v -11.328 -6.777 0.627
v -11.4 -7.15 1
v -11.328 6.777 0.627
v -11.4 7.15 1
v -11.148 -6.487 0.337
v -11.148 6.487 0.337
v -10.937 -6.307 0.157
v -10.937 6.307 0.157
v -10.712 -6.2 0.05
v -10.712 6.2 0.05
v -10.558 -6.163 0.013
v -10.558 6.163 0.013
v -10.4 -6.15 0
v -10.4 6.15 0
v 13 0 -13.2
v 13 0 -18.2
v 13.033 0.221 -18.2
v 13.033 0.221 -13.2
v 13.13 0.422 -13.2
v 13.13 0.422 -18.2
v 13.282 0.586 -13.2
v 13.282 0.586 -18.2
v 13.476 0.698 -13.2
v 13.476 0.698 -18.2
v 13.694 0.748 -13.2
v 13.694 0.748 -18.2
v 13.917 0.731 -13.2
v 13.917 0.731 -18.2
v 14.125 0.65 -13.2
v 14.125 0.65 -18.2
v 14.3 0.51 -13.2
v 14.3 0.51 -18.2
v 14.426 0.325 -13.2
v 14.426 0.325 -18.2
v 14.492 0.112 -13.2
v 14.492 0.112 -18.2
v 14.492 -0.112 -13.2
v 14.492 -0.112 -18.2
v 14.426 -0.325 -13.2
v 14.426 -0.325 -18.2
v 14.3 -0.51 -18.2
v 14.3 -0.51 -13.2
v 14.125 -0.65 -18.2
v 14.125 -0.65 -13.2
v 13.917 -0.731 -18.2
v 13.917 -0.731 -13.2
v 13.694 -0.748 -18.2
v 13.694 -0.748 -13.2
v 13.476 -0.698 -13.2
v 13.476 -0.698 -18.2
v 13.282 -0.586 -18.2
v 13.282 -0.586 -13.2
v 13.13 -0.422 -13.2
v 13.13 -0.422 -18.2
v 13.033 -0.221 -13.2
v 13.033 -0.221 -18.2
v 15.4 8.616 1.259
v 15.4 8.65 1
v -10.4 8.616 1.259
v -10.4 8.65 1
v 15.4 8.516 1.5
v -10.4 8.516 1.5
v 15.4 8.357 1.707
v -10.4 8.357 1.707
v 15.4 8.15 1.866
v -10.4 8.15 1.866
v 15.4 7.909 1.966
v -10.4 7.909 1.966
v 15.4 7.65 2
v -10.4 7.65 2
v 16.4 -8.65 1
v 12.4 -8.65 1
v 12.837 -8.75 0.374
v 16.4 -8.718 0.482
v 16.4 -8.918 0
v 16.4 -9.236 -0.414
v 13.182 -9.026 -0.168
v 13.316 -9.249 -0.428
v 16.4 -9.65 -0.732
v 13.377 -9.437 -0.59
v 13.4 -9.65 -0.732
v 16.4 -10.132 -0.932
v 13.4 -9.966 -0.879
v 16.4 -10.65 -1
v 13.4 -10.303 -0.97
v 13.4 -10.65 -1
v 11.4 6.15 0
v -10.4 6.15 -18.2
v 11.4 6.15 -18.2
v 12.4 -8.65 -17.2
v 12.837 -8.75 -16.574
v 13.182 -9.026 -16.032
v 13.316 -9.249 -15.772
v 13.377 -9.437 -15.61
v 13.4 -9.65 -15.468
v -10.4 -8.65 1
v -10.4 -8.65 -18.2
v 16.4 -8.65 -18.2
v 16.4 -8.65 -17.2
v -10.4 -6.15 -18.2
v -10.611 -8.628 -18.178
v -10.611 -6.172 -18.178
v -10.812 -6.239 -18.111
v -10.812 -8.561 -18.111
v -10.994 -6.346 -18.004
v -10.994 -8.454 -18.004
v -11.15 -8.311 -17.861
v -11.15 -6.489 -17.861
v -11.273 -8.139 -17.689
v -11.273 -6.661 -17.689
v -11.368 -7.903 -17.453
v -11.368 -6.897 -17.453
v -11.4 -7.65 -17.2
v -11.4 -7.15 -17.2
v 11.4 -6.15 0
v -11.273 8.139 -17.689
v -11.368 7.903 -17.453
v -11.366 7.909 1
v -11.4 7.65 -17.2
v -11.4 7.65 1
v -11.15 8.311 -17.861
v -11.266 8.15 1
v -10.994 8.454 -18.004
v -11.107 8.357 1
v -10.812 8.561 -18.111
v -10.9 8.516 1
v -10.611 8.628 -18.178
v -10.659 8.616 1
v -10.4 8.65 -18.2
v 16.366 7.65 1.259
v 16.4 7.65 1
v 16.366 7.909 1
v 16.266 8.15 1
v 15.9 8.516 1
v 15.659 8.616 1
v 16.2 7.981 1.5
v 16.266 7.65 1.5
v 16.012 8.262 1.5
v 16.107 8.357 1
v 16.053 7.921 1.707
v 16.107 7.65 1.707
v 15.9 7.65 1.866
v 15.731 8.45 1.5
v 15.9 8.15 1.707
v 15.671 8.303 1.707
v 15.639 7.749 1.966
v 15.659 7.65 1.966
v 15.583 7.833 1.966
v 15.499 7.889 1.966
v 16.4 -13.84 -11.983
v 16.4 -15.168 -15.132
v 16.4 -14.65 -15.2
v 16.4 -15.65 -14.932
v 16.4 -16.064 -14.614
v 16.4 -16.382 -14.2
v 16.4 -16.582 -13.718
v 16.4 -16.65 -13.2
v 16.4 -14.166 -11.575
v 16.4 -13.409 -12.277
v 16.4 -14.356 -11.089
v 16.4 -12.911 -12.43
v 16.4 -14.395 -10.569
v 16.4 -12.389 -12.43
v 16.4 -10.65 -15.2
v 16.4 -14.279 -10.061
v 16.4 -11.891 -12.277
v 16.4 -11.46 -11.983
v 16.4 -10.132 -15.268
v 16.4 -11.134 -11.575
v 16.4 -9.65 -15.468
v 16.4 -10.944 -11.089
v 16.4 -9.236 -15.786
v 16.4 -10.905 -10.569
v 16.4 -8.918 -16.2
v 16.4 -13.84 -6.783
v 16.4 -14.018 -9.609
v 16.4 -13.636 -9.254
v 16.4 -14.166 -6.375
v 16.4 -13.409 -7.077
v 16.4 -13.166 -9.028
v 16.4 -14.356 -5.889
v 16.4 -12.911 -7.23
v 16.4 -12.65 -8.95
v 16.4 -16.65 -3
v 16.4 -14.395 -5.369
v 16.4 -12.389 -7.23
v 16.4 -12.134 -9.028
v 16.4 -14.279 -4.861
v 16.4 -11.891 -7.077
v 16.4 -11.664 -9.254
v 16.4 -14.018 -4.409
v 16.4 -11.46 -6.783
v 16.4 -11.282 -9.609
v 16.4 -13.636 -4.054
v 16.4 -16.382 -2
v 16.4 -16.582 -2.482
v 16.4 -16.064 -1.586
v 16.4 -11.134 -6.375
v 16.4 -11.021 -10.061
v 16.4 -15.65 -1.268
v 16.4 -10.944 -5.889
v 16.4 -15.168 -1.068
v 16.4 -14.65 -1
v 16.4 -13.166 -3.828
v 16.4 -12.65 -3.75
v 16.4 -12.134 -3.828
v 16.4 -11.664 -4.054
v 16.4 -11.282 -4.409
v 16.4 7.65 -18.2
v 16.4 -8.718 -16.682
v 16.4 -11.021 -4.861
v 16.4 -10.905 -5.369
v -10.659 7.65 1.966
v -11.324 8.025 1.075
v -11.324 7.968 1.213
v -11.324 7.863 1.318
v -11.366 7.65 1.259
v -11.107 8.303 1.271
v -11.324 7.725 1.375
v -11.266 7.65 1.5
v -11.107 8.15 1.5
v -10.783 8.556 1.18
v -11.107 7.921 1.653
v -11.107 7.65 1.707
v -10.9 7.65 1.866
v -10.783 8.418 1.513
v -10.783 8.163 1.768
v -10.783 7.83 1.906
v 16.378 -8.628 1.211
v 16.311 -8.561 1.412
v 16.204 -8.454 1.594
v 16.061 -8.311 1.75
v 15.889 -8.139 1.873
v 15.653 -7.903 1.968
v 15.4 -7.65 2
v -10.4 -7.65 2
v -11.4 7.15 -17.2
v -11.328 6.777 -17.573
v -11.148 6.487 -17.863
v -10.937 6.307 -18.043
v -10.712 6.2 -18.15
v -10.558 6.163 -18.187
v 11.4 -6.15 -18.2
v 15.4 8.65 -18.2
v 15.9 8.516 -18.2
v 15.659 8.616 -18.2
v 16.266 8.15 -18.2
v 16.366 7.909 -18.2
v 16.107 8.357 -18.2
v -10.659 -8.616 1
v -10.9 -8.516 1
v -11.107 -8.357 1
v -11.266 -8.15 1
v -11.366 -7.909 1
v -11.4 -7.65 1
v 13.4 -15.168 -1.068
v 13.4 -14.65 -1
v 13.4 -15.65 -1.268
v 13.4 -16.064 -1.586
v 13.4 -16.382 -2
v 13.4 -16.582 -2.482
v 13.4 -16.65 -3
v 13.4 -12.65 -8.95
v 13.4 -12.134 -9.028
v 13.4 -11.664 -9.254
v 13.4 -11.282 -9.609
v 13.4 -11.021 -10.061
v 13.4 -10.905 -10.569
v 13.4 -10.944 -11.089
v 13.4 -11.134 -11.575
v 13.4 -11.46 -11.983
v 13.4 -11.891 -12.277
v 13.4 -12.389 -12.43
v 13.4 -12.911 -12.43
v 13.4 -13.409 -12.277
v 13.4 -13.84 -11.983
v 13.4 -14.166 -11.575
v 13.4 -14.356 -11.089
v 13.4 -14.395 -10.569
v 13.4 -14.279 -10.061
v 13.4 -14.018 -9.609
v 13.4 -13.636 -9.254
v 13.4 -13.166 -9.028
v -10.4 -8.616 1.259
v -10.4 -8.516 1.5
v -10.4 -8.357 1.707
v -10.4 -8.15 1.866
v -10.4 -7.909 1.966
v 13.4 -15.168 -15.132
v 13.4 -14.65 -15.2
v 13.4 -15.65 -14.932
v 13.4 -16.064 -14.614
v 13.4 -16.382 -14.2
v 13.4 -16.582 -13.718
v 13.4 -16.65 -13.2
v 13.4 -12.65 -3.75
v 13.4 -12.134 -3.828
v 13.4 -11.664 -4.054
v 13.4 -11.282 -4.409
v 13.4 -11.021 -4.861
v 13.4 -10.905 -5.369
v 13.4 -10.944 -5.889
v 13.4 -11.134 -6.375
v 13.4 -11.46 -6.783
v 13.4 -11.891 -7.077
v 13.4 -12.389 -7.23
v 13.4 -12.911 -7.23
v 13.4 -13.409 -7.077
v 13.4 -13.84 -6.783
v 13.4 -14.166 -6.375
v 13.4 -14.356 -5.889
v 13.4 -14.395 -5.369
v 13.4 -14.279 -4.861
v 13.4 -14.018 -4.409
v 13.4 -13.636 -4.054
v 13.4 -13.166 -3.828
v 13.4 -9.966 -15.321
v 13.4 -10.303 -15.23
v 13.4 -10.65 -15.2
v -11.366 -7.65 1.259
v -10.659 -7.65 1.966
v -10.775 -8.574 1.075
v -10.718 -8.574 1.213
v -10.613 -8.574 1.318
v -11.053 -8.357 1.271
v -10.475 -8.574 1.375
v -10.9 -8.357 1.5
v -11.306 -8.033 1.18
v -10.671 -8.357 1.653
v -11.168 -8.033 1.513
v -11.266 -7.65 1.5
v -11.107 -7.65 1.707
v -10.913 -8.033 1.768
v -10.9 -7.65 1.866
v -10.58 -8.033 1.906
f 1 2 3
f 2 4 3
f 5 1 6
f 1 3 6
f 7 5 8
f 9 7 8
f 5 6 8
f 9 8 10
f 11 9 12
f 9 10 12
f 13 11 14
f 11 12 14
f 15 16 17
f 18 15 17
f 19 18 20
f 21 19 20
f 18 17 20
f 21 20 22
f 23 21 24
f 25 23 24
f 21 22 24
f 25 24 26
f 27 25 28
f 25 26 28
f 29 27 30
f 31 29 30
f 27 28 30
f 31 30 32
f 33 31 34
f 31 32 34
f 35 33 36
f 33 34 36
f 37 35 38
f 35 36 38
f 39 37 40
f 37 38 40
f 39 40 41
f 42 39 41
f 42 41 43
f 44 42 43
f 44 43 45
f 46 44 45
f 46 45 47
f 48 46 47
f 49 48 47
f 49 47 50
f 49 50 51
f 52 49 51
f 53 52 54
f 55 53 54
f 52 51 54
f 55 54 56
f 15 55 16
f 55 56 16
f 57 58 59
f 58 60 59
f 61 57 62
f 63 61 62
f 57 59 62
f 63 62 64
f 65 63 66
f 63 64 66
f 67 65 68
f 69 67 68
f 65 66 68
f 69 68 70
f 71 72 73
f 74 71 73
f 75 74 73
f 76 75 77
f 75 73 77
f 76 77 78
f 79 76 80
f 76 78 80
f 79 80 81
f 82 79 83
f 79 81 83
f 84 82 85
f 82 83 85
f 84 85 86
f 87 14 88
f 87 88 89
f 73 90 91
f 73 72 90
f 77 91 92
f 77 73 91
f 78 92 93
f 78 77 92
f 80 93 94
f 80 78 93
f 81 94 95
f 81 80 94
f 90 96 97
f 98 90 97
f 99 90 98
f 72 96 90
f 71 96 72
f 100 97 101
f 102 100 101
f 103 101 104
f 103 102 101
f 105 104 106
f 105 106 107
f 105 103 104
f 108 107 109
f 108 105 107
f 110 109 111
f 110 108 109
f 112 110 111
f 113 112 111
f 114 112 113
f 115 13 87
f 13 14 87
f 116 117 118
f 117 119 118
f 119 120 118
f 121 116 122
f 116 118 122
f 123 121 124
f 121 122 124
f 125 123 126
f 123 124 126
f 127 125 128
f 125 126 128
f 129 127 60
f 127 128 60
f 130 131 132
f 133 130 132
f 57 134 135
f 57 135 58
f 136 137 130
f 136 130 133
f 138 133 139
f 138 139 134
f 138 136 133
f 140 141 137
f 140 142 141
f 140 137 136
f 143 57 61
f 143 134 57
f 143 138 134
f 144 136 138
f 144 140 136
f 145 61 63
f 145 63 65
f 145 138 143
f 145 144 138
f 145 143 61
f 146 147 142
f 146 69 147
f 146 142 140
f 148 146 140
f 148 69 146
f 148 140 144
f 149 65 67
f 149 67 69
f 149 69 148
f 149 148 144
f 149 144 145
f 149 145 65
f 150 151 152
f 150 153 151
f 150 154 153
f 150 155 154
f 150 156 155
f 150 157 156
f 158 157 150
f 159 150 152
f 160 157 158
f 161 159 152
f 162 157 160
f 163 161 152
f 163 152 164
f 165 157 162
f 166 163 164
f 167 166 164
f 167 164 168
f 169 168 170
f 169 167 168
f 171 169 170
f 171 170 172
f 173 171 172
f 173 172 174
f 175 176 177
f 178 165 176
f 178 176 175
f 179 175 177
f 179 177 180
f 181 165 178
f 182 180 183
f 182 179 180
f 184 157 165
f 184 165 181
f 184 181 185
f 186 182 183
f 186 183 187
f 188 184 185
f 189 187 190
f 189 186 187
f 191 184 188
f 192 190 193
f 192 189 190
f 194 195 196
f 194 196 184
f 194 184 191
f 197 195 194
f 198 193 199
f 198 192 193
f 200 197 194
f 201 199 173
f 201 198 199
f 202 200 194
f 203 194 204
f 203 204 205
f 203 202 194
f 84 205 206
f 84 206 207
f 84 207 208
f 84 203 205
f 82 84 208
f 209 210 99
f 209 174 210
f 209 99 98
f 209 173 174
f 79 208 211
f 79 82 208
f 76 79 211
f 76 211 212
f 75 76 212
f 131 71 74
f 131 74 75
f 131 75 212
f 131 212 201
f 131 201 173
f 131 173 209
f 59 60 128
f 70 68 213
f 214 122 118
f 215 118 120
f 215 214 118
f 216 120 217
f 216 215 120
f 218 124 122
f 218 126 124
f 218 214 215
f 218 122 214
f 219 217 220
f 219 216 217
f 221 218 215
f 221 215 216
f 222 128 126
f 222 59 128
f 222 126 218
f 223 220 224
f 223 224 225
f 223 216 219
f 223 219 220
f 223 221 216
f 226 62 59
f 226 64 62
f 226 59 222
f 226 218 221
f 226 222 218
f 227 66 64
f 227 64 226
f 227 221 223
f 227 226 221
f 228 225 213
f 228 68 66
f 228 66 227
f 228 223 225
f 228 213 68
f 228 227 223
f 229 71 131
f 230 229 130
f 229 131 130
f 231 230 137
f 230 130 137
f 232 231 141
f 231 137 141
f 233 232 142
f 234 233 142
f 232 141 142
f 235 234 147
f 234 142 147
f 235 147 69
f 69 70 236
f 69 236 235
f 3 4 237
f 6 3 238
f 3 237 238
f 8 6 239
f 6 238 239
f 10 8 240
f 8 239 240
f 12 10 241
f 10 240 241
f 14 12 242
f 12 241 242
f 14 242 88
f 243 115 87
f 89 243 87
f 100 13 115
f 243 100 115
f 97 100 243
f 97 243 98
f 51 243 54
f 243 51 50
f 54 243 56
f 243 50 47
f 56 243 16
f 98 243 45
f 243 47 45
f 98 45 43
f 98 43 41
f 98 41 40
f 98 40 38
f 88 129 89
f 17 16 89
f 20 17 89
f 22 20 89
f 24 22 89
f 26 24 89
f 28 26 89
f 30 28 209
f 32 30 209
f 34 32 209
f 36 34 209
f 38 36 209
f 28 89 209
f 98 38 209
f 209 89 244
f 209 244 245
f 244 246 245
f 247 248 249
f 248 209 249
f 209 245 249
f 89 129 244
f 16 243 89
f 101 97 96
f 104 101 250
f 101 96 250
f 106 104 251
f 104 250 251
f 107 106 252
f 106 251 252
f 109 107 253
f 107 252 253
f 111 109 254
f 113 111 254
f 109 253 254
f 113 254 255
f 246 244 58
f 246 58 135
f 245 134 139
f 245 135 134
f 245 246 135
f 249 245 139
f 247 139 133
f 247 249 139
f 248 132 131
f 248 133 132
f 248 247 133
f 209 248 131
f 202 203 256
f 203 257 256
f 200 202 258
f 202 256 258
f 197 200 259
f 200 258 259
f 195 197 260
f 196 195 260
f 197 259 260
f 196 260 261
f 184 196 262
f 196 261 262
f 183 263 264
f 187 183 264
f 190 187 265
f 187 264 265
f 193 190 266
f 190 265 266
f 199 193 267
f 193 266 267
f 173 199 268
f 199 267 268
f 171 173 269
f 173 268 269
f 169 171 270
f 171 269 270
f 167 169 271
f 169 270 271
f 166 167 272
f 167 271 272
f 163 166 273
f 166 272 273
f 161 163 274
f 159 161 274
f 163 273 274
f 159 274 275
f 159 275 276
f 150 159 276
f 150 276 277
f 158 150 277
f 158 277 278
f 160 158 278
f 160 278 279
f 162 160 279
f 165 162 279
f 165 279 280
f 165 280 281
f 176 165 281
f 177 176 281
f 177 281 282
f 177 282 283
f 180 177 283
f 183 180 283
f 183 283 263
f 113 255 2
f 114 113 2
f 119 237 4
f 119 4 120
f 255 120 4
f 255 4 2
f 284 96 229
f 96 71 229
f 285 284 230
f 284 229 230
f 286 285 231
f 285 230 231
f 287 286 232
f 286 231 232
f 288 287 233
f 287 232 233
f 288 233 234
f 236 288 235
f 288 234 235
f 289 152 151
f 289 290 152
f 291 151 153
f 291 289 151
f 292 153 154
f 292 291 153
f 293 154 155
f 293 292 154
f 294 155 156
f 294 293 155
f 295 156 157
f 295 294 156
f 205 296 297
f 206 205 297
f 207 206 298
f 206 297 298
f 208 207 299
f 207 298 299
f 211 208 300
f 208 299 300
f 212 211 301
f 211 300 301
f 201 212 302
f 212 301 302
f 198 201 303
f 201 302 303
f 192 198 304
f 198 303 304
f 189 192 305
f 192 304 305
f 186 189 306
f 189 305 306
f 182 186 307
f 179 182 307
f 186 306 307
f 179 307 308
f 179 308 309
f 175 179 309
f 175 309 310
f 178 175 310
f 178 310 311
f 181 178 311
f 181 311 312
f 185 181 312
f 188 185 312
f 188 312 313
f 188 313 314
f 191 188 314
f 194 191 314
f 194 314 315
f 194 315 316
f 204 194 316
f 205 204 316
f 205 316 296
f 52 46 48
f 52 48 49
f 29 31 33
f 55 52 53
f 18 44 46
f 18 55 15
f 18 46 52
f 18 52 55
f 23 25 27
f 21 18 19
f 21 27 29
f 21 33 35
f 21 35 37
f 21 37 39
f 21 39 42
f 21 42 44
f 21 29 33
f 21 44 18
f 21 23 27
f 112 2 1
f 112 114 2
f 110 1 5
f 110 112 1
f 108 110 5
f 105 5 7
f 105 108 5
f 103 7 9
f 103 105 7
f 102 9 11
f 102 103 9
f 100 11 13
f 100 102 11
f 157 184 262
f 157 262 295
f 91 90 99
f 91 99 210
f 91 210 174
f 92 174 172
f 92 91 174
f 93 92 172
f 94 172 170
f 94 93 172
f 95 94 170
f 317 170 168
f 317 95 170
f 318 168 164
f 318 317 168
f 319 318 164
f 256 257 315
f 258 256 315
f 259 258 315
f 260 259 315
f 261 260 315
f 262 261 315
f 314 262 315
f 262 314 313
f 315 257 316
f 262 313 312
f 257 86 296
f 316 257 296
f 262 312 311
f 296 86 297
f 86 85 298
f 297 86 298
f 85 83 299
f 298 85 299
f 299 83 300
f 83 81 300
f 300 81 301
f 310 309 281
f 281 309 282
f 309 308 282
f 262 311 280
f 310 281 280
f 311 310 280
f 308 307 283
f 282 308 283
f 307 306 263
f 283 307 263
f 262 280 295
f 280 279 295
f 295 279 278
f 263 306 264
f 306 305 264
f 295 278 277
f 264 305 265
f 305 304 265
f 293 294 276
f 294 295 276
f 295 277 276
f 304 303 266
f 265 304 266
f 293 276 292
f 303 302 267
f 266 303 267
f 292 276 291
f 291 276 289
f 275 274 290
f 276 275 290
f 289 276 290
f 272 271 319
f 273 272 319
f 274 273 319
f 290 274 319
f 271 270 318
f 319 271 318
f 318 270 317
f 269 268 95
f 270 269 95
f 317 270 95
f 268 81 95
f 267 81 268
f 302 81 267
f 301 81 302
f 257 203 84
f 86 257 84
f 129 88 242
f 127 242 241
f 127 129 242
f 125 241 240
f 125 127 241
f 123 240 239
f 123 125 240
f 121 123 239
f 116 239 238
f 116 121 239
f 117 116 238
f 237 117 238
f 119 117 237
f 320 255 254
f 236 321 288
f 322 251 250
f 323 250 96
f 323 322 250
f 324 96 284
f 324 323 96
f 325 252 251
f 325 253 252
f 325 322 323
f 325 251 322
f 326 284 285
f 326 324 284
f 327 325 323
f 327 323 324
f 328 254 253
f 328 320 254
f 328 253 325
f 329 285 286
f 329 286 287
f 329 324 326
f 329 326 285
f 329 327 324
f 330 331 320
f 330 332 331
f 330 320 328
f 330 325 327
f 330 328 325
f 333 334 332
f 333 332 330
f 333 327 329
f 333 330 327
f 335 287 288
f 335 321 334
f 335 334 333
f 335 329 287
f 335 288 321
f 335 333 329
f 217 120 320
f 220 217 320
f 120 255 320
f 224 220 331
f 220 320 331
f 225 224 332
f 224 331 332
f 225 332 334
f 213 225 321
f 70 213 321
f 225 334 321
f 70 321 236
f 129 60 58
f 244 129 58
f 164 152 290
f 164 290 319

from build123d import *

# Parameters (mm, degrees)
SKETCH1_W           = 22.8
SKETCH1_H           = 12.3
BOSS_EXTRUDE1_DEPTH = 2
SKETCH2_W           = 32.8
SKETCH2_H           = 17.3
SKETCH2_W_2         = 22.8
SKETCH2_H_2         = 12.3
BOSS_EXTRUDE2_DEPTH = 20.2
SKETCH3_W           = 15.2
SKETCH3_H           = 11.3
CUT_EXTRUDE1_DEPTH  = 5
FILLET1_R           = 1
SKETCH4_R           = 0.75
CUT_EXTRUDE2_DEPTH  = 5
SKETCH5_W           = 3.5
SKETCH5_H           = 17.3
CUT_EXTRUDE3_DEPTH  = 28.419381831
FILLET2_R           = 1
SKETCH8_W           = 14.2
SKETCH8_H           = 8
BOSS_EXTRUDE4_DEPTH = 3
SKETCH9_R           = 1.75
CUT_EXTRUDE5_DEPTH  = 37.057627487
FILLET4_R           = 2
SKETCH10_W          = 2.29579642
SKETCH10_H          = 17.3
CUT_EXTRUDE6_DEPTH  = 31.890492065
FILLET5_R           = 1
FILLET6_R           = 1


with BuildPart() as part:
    # Sketch1 → Boss-Extrude1 (new body)
    with BuildSketch(Plane.XY):
        Rectangle(SKETCH1_W, SKETCH1_H)
    extrude(amount=BOSS_EXTRUDE1_DEPTH)

    # Sketch2 → Boss-Extrude2 (add)
    with BuildSketch(Plane.XY.offset(2)):
        Rectangle(SKETCH2_W, SKETCH2_H)
        Rectangle(SKETCH2_W_2, SKETCH2_H_2, mode=Mode.SUBTRACT)
    extrude(amount=-BOSS_EXTRUDE2_DEPTH)

    # Sketch3 → Cut-Extrude1 (cut)
    with BuildSketch(Plane.ZY.offset(16.4)):
        with Locations((-10.6, 0)):
            Rectangle(SKETCH3_W, SKETCH3_H)
    extrude(amount=-CUT_EXTRUDE1_DEPTH, mode=Mode.SUBTRACT)

    # Fillet1
    fillet1_edges = [part.edges().sort_by_distance(p)[0] for p in [
        (-13.9, 5.65, -3),
        (-13.9, -5.65, -3),
    ]]
    fillet(fillet1_edges, radius=FILLET1_R)

    # Sketch4 → Cut-Extrude2 (cut)
    with BuildSketch(Plane(origin=(0, 0, -18.2), x_dir=(-1, 0, 0), z_dir=(0, 0, -1))):
        with Locations((-13.75, 0)):
            Circle(SKETCH4_R)
    extrude(amount=-CUT_EXTRUDE2_DEPTH, mode=Mode.SUBTRACT)

    # Sketch5 → Cut-Extrude3 (cut, through all)
    with BuildSketch(Plane(origin=(0, 0, -18.2), x_dir=(-1, 0, 0), z_dir=(0, 0, -1))):
        with Locations((14.65, 0)):
            Rectangle(SKETCH5_W, SKETCH5_H)
    extrude(amount=-CUT_EXTRUDE3_DEPTH, mode=Mode.SUBTRACT)

    # Fillet2
    fillet2_edges = [part.edges().sort_by_distance(p)[0] for p in [
        (16.4, 8.65, -8.1),
        (-12.9, 5.357106781, -3.292893219),
        (-12.9, -7.15, -18.2),
        (-12.9, 7.15, -18.2),
        (-12.9, -5.65, -11.1),
        (-12.9, -5.357106781, -3.292893219),
        (-12.9, 0, -3),
        (-12.9, 5.65, -11.1),
        (-12.9, 0, 2),
        (-12.9, -8.65, -8.1),
        (-12.9, 8.65, -8.1),
    ]]
    fillet(fillet2_edges, radius=FILLET2_R)

    # Sketch8 → Boss-Extrude4 (add)
    with BuildSketch(Plane(origin=(16.4, 0, 0), x_dir=(0, 0, -1), z_dir=(1, 0, 0))):
        with Locations((8.1, -12.65)):
            Rectangle(SKETCH8_W, SKETCH8_H)
    extrude(amount=-BOSS_EXTRUDE4_DEPTH)

    # Sketch9 → Cut-Extrude5 (cut, through all)
    with BuildSketch(Plane.ZY.offset(-13.4)):
        with Locations((-10.7, -12.65)):
            Circle(SKETCH9_R)
        with Locations((-5.5, -12.65)):
            Circle(SKETCH9_R)
    extrude(amount=-CUT_EXTRUDE5_DEPTH, mode=Mode.SUBTRACT)

    # Fillet4
    fillet4_edges = [part.edges().sort_by_distance(p)[0] for p in [
        (14.9, -16.65, -1),
        (14.9, -8.65, -1),
        (14.9, -8.65, -15.2),
        (14.9, -16.65, -15.2),
    ]]
    fillet(fillet4_edges, radius=FILLET4_R)

    # Sketch10 → Cut-Extrude6 (cut, through all)
    with BuildSketch(Plane(origin=(0, 0, -18.2), x_dir=(-1, 0, 0), z_dir=(0, 0, -1))):
        with Locations((12.54789821, 0)):
            Rectangle(SKETCH10_W, SKETCH10_H)
    extrude(amount=-CUT_EXTRUDE6_DEPTH, mode=Mode.SUBTRACT)

    # Fillet5
    fillet5_edges = [part.edges().sort_by_distance(p)[0] for p in [
        (16.4, -0.5, 2),
        (16.107106781, 8.357106781, 2),
        (-11.4, 6.15, -9.1),
        (-11.4, 7.4, -18.2),
        (-11.4, 8.65, -8.1),
        (-11.4, 0, 2),
        (-11.4, -8.65, -8.1),
        (-11.4, -7.4, -18.2),
        (-11.4, -6.15, -9.1),
        (-11.4, 0, 0),
        (2.5, -8.65, 2),
        (2, 8.65, 2),
    ]]
    fillet(fillet5_edges, radius=FILLET5_R - 0.0001)  # a hair under: the kernel refuses the full size

    # Fillet6
    fillet6_edges = [part.edges().sort_by_distance(p)[0] for p in [
        (13.4, -8.65, -8.1),
    ]]
    fillet(fillet6_edges, radius=FILLET6_R)


solid = part.part
